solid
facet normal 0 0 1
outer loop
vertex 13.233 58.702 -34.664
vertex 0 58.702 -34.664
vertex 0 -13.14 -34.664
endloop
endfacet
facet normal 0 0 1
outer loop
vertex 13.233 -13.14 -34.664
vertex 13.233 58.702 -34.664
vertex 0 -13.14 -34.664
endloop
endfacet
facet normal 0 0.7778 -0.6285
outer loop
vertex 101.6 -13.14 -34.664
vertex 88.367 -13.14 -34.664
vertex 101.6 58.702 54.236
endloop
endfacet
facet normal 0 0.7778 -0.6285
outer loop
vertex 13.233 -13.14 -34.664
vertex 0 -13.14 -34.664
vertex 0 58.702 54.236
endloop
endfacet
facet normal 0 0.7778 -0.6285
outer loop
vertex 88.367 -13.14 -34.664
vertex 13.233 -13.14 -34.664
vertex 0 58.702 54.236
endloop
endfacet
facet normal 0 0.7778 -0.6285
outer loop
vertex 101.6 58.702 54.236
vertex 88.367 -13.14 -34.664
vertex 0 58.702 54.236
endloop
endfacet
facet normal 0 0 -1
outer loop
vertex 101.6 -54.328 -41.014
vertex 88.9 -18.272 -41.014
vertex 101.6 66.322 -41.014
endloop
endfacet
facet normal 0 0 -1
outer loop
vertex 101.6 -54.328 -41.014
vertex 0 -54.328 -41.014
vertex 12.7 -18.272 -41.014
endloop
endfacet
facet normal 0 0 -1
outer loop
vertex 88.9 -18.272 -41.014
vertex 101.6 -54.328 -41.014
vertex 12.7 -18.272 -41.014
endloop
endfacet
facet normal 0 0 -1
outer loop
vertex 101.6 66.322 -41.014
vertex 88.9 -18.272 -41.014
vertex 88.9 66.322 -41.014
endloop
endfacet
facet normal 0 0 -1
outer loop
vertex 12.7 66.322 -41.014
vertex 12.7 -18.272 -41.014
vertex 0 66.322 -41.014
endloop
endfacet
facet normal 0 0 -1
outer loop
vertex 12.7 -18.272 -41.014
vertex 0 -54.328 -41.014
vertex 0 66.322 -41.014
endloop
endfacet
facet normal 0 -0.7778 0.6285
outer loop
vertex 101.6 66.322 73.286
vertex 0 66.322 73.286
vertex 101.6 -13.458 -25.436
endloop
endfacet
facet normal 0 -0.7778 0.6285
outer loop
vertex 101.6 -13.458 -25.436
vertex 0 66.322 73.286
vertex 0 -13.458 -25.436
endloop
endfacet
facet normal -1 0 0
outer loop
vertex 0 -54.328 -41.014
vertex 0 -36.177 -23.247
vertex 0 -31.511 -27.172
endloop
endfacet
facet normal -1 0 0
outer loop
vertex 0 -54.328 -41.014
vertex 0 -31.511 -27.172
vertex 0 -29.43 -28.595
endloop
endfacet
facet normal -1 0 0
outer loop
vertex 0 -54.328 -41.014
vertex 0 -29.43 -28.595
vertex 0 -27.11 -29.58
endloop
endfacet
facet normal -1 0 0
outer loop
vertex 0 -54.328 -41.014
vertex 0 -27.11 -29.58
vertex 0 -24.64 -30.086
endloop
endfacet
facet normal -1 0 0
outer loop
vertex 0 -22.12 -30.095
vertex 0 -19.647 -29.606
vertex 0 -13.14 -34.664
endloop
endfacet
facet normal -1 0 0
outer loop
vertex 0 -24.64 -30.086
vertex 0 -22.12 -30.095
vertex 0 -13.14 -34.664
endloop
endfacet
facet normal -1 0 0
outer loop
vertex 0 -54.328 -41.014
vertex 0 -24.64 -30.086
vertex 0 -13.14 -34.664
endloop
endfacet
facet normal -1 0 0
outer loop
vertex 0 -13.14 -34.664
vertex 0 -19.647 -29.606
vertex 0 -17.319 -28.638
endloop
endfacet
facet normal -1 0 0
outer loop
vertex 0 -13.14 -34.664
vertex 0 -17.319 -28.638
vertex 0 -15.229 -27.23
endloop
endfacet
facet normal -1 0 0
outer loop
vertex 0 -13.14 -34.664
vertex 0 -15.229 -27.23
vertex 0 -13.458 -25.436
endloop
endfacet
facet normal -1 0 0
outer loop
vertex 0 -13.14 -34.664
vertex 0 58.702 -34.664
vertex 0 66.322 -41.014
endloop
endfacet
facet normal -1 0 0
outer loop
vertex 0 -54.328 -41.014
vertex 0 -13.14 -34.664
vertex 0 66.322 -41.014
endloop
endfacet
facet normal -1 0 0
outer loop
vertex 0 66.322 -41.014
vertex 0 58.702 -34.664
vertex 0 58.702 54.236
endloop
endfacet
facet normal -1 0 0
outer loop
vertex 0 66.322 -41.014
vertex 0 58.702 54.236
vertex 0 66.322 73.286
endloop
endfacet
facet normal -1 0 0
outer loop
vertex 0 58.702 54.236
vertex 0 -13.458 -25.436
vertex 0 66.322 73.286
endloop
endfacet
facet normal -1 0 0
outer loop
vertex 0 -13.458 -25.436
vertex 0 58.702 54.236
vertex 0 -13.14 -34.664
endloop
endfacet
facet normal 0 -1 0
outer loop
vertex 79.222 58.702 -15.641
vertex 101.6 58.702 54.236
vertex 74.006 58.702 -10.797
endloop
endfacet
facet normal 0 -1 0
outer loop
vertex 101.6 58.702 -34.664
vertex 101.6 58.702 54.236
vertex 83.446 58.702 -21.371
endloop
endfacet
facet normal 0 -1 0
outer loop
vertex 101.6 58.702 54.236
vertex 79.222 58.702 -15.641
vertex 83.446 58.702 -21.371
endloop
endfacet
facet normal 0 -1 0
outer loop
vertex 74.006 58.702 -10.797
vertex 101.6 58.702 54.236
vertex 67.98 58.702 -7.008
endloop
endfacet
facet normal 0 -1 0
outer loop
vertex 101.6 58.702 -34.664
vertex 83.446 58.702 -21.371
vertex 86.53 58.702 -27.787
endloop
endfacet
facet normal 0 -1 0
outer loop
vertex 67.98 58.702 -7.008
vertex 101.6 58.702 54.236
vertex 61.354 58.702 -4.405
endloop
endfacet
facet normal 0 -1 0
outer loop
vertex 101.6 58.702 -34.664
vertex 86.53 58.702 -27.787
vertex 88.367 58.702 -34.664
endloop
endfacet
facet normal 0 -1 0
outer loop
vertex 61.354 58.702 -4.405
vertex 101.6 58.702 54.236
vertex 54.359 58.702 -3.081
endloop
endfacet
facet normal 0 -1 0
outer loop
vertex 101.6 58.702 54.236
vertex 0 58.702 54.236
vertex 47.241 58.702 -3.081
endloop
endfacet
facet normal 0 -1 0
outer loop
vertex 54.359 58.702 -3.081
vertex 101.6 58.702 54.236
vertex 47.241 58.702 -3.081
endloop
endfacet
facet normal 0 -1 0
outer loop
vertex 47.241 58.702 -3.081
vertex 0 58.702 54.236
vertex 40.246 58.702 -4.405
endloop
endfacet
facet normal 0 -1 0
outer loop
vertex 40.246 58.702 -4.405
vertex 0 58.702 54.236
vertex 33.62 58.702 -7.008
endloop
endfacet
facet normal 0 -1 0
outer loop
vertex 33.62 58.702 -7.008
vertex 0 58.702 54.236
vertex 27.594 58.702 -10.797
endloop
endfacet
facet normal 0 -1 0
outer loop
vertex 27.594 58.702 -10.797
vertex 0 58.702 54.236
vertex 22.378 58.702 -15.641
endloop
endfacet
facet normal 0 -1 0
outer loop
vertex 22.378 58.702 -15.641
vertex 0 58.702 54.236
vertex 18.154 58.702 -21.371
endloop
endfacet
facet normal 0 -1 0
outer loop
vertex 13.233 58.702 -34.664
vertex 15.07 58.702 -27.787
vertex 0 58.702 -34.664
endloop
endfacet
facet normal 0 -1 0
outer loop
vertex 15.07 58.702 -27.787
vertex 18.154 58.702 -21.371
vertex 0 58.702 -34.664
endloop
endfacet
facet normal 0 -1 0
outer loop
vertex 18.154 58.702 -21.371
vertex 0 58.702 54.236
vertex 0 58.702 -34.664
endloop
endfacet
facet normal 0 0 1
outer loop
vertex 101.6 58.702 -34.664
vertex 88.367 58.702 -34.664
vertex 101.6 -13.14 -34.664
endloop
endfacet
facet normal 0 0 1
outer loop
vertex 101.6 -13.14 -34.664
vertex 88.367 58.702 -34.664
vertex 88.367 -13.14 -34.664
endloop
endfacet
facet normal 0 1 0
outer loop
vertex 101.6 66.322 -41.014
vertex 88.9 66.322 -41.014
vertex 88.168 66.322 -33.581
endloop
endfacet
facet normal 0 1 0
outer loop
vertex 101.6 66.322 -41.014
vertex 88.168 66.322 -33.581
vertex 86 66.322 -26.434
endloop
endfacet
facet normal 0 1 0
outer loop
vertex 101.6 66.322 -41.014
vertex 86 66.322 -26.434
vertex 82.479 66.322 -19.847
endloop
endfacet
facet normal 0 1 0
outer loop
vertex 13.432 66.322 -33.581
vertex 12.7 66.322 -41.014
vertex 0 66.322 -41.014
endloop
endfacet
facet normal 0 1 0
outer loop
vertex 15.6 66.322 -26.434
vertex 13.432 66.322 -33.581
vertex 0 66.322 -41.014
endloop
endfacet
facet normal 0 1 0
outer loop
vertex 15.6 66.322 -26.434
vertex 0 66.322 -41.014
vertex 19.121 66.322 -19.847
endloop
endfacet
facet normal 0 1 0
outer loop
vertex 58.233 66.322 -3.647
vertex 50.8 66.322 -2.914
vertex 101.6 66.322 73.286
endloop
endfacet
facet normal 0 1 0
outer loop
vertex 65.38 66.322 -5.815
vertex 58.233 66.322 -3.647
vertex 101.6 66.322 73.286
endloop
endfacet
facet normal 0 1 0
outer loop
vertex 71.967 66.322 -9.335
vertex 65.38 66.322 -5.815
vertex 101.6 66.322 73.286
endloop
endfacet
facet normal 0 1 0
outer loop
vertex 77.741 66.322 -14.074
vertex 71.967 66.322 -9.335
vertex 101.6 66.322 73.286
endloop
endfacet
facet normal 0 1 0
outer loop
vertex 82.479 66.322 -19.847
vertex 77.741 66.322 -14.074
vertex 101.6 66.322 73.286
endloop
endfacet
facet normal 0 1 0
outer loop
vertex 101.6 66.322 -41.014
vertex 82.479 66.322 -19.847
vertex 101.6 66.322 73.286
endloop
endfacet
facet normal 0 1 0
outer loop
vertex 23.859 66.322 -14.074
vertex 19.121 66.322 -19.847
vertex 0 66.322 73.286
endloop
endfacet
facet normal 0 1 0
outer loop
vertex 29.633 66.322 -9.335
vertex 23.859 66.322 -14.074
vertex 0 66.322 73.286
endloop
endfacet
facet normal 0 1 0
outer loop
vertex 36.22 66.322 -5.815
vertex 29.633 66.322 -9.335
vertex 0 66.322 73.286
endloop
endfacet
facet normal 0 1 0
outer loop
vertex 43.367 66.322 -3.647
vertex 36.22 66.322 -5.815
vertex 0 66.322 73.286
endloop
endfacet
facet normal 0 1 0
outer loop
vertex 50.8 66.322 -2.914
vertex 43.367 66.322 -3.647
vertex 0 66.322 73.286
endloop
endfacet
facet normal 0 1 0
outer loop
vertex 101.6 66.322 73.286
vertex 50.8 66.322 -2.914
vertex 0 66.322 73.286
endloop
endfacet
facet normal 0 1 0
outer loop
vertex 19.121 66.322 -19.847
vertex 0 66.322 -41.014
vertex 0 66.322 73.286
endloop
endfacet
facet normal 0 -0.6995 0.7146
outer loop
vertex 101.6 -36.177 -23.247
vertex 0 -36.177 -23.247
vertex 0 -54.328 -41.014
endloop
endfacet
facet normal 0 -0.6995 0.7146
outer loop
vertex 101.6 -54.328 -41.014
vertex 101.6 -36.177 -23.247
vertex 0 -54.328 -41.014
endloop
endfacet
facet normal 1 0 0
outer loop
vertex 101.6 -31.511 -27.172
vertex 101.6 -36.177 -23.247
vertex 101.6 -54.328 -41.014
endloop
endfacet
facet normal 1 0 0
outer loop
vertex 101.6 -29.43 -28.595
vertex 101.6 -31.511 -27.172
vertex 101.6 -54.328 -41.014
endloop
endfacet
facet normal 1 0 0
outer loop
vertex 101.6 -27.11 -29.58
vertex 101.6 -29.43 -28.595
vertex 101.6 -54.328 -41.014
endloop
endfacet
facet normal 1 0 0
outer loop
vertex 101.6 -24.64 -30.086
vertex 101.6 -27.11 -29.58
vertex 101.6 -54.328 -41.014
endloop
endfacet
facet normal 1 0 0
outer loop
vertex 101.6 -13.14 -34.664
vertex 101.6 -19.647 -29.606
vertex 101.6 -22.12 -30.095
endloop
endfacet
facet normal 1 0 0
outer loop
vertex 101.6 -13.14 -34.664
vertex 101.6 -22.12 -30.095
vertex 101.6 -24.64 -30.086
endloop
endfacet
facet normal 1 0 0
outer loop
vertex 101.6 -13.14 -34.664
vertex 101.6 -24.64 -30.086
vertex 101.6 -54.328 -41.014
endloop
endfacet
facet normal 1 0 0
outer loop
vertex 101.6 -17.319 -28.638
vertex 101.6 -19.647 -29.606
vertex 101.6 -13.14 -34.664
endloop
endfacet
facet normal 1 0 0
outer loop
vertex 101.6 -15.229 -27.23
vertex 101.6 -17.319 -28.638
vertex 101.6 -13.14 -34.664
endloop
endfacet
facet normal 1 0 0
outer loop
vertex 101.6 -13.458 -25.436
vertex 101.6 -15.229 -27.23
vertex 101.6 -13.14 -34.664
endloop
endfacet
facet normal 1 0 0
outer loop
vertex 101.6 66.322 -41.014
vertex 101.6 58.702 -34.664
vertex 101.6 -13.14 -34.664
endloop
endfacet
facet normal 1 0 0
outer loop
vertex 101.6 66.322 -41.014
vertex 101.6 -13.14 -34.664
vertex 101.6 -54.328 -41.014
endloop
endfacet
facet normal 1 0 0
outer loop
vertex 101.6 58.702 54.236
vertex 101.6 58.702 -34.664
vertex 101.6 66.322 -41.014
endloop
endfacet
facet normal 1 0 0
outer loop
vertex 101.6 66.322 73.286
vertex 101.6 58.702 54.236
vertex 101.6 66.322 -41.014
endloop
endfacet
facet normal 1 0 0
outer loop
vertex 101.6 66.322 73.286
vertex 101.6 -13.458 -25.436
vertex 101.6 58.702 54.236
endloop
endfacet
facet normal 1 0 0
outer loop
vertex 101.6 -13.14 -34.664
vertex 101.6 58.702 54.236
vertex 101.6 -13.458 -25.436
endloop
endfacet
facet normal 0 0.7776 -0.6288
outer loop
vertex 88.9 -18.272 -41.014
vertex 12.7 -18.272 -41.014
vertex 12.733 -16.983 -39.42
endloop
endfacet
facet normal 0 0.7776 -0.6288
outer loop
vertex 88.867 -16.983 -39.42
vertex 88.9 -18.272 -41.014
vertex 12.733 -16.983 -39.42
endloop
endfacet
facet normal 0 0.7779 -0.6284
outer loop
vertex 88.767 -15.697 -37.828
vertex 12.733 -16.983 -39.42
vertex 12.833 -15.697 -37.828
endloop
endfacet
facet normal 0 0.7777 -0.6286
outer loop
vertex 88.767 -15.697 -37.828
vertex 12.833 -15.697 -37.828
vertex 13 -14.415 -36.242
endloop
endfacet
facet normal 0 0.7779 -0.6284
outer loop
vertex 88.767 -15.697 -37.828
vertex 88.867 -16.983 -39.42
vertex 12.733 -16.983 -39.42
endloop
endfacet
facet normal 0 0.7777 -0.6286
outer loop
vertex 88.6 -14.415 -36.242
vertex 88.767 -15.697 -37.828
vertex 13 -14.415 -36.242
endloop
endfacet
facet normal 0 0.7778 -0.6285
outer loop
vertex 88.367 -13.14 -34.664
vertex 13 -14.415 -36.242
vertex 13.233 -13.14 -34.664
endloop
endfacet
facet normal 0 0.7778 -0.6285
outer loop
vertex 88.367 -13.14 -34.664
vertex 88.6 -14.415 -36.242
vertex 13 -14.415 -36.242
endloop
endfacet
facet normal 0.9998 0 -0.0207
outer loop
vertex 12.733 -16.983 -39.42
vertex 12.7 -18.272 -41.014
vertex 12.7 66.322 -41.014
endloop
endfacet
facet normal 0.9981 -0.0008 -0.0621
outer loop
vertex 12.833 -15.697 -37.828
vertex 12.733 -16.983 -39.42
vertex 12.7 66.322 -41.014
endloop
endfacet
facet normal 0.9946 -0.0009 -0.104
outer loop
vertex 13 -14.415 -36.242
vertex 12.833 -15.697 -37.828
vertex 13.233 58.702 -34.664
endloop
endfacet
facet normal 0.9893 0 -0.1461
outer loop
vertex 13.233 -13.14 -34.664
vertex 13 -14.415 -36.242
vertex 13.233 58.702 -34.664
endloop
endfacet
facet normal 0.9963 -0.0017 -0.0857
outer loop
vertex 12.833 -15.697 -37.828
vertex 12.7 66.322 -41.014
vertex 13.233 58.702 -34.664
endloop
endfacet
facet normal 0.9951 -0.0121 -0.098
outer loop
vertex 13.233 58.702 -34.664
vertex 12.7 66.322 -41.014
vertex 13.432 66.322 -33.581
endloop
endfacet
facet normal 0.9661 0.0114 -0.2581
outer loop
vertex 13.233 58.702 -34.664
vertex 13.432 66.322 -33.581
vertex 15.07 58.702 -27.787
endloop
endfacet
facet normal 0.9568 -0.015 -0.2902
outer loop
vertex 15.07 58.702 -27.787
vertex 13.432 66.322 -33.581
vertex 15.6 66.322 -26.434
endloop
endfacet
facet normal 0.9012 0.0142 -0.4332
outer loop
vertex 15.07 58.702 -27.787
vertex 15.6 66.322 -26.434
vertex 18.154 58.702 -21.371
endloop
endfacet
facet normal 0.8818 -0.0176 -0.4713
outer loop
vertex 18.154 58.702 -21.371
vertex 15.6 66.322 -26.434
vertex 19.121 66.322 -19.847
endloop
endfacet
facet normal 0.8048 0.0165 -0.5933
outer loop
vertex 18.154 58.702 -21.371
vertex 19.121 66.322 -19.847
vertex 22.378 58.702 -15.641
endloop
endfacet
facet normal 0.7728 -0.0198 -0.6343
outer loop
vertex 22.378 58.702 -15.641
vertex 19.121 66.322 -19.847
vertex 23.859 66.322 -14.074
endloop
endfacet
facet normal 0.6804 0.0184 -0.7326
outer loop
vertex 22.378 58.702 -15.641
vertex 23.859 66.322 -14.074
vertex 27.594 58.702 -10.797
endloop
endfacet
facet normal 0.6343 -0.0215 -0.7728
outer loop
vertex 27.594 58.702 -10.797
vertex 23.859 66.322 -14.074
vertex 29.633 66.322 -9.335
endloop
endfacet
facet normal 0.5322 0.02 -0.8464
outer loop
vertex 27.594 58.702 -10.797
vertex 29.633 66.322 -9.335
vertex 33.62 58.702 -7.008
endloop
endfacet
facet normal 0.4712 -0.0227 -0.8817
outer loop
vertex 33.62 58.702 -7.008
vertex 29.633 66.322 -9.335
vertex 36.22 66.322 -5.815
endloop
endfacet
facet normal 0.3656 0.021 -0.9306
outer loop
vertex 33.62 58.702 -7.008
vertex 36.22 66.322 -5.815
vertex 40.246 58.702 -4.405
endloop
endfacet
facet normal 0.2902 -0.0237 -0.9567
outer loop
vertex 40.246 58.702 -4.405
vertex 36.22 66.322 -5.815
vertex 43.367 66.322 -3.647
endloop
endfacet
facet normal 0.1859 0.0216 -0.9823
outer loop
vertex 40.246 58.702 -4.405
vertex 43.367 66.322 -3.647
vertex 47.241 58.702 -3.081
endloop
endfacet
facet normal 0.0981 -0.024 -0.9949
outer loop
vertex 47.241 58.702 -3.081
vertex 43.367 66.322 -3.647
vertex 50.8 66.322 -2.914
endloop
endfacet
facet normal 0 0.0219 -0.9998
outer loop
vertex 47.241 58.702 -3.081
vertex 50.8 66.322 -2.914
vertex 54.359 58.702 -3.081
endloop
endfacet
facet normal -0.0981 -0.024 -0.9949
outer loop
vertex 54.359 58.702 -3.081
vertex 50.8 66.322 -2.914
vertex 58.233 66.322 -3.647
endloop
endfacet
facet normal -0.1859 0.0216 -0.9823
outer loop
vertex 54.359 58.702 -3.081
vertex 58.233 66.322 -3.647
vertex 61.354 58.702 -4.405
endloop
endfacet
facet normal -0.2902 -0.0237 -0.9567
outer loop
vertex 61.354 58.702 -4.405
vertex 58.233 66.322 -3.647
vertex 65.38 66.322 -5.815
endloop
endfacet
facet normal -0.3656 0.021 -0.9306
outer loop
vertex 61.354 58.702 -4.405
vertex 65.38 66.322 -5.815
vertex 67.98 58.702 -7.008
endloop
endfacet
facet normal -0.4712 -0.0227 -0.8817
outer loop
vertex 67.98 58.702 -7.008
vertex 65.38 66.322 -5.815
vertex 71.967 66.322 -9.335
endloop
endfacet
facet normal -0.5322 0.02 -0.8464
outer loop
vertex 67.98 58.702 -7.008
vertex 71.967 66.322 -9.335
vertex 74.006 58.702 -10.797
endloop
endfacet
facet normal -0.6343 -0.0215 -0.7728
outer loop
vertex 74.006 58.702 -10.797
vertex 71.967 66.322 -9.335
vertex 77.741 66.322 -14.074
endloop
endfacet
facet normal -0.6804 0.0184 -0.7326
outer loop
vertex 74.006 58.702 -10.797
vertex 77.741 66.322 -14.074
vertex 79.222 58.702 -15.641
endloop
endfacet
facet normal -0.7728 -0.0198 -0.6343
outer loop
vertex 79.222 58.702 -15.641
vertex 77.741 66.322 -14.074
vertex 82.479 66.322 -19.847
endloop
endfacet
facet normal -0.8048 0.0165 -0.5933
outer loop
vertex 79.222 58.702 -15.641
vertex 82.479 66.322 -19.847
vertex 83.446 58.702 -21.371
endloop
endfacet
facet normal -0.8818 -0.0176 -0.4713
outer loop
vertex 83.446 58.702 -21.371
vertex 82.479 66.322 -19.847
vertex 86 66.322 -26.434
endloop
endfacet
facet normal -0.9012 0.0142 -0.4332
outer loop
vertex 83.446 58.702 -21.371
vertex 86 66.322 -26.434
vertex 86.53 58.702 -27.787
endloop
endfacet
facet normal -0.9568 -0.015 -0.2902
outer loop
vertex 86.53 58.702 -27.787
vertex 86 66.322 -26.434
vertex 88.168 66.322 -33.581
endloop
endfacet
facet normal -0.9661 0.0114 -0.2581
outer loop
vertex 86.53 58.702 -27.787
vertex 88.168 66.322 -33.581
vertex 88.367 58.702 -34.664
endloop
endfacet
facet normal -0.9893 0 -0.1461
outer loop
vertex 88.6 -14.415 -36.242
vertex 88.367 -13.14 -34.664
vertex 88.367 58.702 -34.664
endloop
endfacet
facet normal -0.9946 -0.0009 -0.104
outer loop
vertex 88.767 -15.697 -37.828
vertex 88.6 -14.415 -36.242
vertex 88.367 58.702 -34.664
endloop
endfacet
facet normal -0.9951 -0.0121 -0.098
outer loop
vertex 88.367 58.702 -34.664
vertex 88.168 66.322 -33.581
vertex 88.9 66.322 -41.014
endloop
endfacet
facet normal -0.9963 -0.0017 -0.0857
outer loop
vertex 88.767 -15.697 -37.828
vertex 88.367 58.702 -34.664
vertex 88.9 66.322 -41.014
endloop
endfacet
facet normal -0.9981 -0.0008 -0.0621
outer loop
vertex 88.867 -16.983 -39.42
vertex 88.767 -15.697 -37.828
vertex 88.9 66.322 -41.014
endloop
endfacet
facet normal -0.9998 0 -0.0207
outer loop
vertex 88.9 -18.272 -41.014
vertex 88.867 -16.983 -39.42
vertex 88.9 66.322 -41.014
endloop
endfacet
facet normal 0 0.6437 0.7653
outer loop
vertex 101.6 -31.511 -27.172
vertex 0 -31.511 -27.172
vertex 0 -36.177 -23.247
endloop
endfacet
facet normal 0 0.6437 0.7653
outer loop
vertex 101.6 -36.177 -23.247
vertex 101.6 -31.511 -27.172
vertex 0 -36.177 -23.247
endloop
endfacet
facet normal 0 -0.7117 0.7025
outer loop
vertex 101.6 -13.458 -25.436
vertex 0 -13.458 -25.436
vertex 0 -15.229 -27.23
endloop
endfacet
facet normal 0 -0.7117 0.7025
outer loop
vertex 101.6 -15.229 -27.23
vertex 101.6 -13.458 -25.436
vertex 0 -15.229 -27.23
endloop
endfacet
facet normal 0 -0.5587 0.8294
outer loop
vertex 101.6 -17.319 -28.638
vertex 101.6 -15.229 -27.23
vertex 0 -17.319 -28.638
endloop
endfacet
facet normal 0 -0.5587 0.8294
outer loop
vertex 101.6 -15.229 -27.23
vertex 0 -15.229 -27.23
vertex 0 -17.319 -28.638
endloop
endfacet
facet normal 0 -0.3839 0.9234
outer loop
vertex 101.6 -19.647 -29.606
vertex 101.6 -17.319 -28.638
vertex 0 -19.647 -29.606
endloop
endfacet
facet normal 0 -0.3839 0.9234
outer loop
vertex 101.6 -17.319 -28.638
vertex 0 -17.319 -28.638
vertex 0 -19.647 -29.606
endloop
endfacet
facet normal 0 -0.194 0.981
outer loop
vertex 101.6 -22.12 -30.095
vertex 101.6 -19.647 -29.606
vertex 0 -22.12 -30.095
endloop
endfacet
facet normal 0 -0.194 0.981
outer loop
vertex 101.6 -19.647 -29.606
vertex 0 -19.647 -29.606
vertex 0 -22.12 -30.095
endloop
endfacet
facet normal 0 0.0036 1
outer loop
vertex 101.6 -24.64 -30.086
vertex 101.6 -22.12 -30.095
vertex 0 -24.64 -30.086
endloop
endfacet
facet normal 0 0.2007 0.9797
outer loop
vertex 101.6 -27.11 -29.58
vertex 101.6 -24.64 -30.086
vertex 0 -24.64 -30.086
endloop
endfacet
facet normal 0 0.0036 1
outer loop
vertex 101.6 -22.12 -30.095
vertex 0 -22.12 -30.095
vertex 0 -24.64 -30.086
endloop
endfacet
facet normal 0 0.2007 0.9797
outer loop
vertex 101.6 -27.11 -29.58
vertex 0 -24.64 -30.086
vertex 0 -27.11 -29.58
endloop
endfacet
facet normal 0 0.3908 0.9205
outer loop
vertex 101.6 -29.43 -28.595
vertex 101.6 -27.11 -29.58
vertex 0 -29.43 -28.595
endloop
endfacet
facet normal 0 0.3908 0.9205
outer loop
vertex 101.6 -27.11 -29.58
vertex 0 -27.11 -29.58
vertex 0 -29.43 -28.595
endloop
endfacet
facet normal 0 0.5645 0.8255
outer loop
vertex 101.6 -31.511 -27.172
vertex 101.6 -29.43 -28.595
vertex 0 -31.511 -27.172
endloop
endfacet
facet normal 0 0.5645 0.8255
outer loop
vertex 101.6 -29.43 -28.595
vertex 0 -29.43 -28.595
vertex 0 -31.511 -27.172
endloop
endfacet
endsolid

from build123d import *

# Parameters (mm, degrees)
F1_DEPTH = 101.6
F3_REACH = 205.8451899427


with BuildPart() as f1:
    # F0 (on Right) → F1 (new body)
    with BuildSketch(Plane.YZ):
        with BuildLine():
            Line((-36.1766421175, -23.2471508509), (-54.3283293044, -41.0144312356))
            Line((-54.3283293044, -41.0144312356), (58.7016706956, -41.0144312356))
            Line((58.7016706956, -41.0144312356), (58.7016706956, -34.6644312356))
            Line((58.7016706956, -34.6644312356), (-13.140378273, -34.6644312356))
            Line((-13.140378273, -34.6644312356), (58.7016706956, 54.2355687644))
            Line((58.7016706956, 54.2355687644), (66.3216706956, 54.2355687644))
            Line((66.3216706956, 54.2355687644), (66.3216706956, 73.2855687644))
            Line((66.3216706956, 73.2855687644), (-13.4575252541, -25.4361495295))
            ThreePointArc((-13.4575252541, -25.4361495295), (-22.1196896865, -30.0953879884), (-31.5109779006, -27.1721532474))
            Line((-31.5109779006, -27.1721532474), (-36.1766421175, -23.2471508509))
        make_face()
        Polygon((58.7016706956, -34.6644312356), (58.7016706956, -41.0144312356), (66.3216706956, -41.0144312356), (66.3216706956, 54.2355687644), (58.7016706956, 54.2355687644), align=None)
    extrude(amount=F1_DEPTH)

    f3_end = Plane(origin=(50.8, 22.7806462113, 9.7855687644), x_dir=(0, 0.6285393611, 0.7777777778), z_dir=(0, 0.7777777778, -0.6285393611))
    # F2 (on face) → F3 (cut, up to a plane its end follows)
    with BuildSketch(Plane(origin=(0, 66.3216706956, 0), x_dir=(-1, 0, 0), z_dir=(0, 1, 0))):
        with BuildLine():
            Line((-88.9, -41.0144312356), (-12.7, -41.0144312356))
            ThreePointArc((-12.7, -41.0144312356), (-50.8, -2.9144312356), (-88.9, -41.0144312356))
        make_face()
    f3_long = extrude(amount=-F3_REACH, mode=Mode.PRIVATE)
    add(split(f3_long, bisect_by=f3_end, keep=Keep.TOP, mode=Mode.PRIVATE), mode=Mode.SUBTRACT)


solid = f1.part
